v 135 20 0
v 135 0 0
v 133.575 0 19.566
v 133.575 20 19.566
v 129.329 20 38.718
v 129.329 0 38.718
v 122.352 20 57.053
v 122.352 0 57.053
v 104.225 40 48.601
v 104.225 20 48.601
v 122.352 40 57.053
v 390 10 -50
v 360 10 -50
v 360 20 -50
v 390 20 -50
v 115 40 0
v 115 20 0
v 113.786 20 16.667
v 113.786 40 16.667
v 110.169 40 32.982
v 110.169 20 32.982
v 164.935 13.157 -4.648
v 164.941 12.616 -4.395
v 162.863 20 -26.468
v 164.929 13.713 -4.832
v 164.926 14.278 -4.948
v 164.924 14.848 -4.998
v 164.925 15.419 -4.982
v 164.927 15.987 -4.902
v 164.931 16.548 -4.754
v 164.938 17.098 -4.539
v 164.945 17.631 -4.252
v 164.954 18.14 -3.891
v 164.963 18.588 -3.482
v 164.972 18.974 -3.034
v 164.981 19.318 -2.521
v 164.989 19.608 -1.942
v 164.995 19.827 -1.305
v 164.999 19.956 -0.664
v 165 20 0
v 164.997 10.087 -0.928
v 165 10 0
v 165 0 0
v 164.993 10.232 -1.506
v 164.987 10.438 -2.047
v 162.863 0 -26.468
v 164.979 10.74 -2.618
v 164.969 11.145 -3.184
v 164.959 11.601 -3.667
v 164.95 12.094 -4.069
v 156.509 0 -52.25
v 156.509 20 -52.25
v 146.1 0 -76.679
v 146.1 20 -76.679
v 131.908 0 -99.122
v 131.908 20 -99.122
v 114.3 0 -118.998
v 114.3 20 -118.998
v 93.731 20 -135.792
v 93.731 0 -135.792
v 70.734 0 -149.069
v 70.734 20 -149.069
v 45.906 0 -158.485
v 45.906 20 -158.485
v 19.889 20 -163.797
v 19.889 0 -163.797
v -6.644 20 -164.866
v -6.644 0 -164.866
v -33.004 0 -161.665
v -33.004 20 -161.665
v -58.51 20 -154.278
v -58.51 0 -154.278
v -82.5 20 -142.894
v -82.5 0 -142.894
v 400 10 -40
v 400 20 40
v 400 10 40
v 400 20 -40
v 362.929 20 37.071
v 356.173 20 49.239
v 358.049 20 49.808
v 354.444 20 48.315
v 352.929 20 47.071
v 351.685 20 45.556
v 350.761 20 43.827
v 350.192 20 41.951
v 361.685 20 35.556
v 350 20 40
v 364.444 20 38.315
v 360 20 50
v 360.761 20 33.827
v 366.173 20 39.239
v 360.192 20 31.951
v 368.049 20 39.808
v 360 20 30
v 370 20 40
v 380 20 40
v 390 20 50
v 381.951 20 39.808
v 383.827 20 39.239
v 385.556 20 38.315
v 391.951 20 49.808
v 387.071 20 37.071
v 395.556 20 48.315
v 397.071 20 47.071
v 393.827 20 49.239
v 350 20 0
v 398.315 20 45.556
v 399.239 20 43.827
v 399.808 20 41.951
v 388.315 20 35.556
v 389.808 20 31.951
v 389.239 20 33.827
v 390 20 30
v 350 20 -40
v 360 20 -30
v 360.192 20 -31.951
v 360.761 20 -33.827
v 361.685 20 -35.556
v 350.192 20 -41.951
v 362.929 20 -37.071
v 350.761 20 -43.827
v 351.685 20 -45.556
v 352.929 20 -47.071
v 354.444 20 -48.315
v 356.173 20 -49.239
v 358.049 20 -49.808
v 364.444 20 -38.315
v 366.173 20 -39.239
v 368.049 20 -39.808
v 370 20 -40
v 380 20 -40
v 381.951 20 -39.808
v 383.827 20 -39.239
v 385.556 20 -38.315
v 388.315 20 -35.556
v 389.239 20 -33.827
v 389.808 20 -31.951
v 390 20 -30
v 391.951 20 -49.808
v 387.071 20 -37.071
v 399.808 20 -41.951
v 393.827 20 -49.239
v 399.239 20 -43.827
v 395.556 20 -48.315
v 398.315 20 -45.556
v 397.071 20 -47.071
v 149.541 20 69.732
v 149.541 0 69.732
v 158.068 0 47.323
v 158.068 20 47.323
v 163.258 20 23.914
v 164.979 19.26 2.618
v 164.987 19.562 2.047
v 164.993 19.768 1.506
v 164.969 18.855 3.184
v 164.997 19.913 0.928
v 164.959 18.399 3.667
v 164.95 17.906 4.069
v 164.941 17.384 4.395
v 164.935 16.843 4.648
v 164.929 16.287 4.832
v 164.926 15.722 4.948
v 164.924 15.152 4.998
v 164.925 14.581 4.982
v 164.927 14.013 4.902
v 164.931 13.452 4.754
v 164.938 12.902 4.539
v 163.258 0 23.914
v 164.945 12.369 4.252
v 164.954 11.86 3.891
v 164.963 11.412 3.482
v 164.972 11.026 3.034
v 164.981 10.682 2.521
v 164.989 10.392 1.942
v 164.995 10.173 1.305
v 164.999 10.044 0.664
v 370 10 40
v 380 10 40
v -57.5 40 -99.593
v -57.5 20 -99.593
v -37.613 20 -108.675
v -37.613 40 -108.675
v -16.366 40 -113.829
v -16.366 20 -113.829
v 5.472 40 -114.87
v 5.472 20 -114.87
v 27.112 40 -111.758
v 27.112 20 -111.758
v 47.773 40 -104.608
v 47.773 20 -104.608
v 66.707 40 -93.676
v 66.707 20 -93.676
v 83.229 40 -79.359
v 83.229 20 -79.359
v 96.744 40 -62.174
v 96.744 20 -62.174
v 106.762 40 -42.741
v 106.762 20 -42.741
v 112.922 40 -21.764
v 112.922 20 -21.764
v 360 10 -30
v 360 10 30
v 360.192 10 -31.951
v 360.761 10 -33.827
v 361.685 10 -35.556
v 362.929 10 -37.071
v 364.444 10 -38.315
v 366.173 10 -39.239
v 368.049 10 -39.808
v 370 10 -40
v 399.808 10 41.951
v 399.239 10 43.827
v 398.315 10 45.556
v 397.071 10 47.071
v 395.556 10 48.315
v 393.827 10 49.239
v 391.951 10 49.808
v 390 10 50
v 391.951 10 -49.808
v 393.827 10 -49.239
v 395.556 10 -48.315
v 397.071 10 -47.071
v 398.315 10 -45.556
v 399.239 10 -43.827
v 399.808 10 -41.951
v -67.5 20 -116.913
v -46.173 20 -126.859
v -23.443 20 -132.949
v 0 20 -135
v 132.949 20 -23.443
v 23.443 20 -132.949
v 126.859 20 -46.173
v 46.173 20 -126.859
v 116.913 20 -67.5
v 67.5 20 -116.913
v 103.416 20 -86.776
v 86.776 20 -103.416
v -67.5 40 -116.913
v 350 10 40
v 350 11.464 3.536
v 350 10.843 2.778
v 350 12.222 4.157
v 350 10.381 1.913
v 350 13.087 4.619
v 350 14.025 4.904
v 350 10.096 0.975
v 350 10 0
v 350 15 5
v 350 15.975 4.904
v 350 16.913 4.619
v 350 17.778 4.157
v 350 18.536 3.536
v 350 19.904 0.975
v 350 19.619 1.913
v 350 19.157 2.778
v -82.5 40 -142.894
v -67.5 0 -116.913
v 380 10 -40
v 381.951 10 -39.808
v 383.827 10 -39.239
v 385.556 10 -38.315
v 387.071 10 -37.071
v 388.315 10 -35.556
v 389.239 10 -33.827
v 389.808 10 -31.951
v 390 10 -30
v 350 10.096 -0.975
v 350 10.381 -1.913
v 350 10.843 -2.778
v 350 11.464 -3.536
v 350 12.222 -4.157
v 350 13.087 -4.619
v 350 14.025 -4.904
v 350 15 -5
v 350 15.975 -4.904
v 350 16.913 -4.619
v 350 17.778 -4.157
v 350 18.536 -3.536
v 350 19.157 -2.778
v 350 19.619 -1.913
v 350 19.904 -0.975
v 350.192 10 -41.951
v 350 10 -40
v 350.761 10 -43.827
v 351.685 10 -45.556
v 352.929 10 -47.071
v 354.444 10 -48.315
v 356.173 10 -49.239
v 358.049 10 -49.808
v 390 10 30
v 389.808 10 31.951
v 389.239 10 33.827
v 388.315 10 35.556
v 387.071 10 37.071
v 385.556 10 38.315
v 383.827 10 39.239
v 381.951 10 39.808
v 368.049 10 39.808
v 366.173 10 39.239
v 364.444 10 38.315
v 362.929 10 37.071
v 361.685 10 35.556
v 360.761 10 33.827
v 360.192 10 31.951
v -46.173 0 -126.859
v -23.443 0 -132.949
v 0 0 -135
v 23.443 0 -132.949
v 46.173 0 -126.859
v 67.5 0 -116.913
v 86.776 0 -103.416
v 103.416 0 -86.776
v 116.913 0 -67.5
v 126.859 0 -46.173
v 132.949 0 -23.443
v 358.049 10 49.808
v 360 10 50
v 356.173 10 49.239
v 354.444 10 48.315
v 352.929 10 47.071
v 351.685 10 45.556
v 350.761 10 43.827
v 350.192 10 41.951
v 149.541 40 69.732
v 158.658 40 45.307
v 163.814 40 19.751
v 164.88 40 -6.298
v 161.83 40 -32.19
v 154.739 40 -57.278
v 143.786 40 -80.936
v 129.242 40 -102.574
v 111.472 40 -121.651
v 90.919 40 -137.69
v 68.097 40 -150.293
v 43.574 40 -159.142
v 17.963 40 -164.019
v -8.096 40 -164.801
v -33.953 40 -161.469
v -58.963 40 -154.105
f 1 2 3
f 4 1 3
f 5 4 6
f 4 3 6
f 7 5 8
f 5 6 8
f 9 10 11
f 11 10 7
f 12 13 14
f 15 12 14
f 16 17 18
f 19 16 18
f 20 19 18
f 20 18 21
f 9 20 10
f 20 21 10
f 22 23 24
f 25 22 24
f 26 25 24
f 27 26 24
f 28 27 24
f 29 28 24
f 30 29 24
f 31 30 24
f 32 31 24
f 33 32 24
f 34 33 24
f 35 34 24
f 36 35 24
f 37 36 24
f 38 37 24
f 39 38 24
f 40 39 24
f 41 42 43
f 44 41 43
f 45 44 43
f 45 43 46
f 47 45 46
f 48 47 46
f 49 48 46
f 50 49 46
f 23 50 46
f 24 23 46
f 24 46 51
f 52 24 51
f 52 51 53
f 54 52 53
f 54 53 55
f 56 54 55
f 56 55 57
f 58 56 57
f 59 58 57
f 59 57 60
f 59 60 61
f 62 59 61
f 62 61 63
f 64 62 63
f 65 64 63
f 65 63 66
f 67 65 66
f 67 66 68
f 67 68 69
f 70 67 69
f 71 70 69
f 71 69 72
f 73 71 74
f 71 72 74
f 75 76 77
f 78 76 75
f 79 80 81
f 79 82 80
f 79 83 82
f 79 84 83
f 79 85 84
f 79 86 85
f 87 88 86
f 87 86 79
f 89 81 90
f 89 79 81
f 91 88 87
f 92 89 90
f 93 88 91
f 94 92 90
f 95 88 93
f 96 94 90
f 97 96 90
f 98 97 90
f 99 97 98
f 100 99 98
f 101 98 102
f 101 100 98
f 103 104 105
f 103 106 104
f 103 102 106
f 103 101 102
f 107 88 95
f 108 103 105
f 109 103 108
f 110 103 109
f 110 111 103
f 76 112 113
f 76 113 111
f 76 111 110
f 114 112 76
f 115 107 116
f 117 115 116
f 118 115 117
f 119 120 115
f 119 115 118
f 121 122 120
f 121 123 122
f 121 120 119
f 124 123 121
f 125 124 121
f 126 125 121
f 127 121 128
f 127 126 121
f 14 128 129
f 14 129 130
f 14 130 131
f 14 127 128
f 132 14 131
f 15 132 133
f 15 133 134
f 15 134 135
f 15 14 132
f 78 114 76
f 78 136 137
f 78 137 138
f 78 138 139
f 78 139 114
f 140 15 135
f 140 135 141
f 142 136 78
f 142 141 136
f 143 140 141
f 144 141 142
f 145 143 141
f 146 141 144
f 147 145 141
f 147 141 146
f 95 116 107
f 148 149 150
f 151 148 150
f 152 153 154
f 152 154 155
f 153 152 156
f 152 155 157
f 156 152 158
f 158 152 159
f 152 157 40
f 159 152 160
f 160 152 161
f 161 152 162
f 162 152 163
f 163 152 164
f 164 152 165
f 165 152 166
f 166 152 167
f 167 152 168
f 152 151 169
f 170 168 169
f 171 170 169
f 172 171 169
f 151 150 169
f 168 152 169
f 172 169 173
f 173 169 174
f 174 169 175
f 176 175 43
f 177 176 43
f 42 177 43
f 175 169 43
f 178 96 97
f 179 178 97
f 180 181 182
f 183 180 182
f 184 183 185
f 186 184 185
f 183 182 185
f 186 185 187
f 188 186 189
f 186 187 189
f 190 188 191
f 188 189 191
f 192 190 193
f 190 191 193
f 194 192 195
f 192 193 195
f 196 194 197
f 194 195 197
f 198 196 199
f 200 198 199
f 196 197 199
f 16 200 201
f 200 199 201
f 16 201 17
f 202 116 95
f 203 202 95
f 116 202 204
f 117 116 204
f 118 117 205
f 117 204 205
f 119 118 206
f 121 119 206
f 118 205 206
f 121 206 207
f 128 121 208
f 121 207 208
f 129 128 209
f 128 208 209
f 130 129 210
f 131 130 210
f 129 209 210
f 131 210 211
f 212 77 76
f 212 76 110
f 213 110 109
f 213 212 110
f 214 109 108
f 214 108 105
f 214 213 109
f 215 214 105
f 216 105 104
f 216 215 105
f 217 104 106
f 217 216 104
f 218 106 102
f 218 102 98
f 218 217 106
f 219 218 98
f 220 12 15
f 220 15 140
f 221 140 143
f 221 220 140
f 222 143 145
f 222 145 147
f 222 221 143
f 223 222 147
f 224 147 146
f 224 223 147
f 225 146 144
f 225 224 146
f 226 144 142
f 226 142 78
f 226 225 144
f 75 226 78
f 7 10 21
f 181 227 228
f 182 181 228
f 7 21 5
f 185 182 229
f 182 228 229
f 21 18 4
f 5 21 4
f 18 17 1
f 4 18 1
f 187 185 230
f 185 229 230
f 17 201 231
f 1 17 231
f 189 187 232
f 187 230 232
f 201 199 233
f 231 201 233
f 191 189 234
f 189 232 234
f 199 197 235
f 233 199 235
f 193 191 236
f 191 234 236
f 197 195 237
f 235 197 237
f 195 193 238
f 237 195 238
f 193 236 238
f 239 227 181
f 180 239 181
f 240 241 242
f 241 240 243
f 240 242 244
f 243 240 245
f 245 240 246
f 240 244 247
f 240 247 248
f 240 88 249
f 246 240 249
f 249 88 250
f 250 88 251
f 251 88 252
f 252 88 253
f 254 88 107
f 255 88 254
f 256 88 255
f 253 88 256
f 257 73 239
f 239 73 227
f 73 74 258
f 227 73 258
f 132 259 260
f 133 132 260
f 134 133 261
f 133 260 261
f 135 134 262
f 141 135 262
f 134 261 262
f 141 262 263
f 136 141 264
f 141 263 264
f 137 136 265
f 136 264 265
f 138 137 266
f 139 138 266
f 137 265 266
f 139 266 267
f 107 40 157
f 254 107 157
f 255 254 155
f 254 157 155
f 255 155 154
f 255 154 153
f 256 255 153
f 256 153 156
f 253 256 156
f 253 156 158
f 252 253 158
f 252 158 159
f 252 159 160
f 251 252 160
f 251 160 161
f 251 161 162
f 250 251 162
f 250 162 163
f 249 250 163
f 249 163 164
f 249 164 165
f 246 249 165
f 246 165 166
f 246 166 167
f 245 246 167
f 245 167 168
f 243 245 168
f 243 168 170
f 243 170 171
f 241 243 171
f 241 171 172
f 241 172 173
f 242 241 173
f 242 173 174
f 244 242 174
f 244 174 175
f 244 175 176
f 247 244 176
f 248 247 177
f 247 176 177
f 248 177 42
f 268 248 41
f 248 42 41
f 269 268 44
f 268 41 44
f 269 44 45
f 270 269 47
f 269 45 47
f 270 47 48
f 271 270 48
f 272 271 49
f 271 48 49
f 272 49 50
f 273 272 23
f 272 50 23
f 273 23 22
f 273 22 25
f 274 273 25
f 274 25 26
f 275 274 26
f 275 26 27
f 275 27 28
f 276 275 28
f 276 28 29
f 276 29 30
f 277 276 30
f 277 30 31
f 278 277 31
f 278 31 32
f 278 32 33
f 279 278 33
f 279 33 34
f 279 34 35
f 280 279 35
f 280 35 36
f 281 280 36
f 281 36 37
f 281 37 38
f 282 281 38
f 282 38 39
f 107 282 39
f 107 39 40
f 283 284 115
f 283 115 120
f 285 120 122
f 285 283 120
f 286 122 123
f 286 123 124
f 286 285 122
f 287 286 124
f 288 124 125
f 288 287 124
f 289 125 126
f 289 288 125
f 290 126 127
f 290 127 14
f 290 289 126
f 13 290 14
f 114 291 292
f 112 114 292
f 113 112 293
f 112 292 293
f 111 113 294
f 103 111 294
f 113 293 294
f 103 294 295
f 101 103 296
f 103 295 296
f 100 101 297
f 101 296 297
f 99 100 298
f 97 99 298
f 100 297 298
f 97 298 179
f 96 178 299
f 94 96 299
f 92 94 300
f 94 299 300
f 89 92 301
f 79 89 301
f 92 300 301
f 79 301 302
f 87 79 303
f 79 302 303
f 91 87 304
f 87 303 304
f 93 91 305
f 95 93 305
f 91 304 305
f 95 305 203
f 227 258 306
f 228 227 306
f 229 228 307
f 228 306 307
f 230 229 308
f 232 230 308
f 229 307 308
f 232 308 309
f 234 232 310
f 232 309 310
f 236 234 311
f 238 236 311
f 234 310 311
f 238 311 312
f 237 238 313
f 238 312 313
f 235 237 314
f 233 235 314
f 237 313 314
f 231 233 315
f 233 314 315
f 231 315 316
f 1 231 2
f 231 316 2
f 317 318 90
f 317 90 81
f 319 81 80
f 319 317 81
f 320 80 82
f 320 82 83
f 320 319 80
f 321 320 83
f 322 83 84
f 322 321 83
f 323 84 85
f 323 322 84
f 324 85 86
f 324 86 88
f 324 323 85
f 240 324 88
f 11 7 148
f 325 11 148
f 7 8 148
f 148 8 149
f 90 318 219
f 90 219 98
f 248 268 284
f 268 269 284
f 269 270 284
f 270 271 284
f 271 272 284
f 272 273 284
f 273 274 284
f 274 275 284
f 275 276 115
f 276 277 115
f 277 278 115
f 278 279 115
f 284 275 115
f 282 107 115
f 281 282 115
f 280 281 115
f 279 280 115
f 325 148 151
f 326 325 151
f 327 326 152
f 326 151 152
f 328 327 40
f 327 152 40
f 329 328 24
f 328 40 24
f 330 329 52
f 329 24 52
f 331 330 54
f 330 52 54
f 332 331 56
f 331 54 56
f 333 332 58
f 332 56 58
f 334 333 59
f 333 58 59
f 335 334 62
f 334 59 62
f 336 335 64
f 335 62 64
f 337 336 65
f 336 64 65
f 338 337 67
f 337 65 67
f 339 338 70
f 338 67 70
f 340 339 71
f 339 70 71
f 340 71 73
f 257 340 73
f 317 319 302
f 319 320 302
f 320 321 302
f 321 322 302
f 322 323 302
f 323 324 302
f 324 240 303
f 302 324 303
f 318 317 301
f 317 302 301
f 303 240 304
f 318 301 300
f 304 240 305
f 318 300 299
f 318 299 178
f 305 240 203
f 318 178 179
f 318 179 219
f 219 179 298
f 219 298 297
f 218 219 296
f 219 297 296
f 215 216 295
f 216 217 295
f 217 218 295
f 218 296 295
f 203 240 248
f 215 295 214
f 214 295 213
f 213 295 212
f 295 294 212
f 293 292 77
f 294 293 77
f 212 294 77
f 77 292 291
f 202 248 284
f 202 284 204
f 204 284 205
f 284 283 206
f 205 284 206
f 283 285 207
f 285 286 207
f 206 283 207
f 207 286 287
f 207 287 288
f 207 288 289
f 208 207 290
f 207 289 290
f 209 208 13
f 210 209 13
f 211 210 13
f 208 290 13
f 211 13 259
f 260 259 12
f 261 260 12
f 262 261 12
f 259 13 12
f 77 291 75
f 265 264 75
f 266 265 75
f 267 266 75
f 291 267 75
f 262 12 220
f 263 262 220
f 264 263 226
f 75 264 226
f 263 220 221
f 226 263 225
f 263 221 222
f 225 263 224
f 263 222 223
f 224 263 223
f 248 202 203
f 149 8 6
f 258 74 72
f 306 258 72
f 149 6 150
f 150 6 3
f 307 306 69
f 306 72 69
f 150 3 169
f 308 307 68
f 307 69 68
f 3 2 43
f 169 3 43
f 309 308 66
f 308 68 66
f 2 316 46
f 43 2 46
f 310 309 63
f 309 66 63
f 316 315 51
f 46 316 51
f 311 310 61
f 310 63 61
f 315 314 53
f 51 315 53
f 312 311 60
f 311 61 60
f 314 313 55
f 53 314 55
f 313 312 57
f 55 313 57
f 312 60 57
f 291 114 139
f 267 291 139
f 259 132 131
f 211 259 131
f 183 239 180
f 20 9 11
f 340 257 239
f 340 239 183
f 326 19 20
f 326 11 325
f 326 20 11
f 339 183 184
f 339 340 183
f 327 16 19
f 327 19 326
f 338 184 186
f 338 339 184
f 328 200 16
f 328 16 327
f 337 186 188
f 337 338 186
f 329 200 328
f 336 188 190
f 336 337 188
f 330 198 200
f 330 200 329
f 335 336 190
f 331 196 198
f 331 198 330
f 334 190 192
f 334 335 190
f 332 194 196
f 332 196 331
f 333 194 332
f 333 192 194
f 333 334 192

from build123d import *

# Parameters (mm, degrees)
BOSS_EXTRUDE1_DEPTH = 20
BOSS_EXTRUDE2_DEPTH = 20
SWEEP1_START        = 164
SWEEP1_OUTLINE_R    = 5
SWEEP1_DEPTH        = 186
SKETCH4_W           = 100
SKETCH4_H           = 10
BOSS_EXTRUDE3_DEPTH = 50
CUT_EXTRUDE1_DEPTH  = 50
FILLET1_START       = 10
FILLET1_DEPTH       = 10
FILLET1_2_DEPTH     = 10


with BuildPart() as part:
    # Sketch1 → Boss-Extrude1 (new body)
    with BuildSketch(Plane(origin=(0, 0, 0), x_dir=(1, 0, 0), z_dir=(0, 1, 0))):
        with BuildLine():
            Line((-82.5, 142.894191624), (-67.5, 116.913429511))
            ThreePointArc((-67.5, 116.913429511), (67.5, 116.913429511), (135, 0))
            ThreePointArc((135, 0), (131.799960961, -29.219347882), (122.35155125, -57.053465335))
            Line((122.35155125, -57.053465335), (149.540784861, -69.732013187))
            ThreePointArc((149.540784861, -69.732013187), (161.088841175, -35.7125363), (165, 0))
            ThreePointArc((165, 0), (82.5, 142.894191624), (-82.5, 142.894191624))
        make_face()
    extrude(amount=BOSS_EXTRUDE1_DEPTH)

    # Sketch2 → Boss-Extrude2 (add)
    with BuildSketch(Plane(origin=(0, 20, 0), x_dir=(1, 0, 0), z_dir=(0, 1, 0))):
        with BuildLine():
            ThreePointArc((122.35155125, -57.053465335), (91.204678028, 99.532440469), (-67.5, 116.913429511))
            Line((-67.5, 116.913429511), (-57.5, 99.592921435))
            ThreePointArc((-57.5, 99.592921435), (57.5, 99.592921435), (115, 0))
            ThreePointArc((115, 0), (112.274040819, -24.890555603), (104.225395509, -48.6011001))
            Line((104.225395509, -48.6011001), (122.35155125, -57.053465335))
        make_face()
        with BuildLine():
            Line((-82.5, 142.894191624), (-67.5, 116.913429511))
            ThreePointArc((-67.5, 116.913429511), (91.204678028, 99.532440469), (122.35155125, -57.053465335))
            Line((122.35155125, -57.053465335), (149.540784861, -69.732013187))
            ThreePointArc((149.540784861, -69.732013187), (111.472384257, 121.650760574), (-82.5, 142.894191624))
        make_face()
    extrude(amount=BOSS_EXTRUDE2_DEPTH)

    # Sweep1: read off the stored shape, not the designer's step
    # Sweep1 outline → Sweep1 (add)
    with BuildSketch(Plane.YZ.offset(SWEEP1_START)):
        with Locations((15, 0)):
            Circle(SWEEP1_OUTLINE_R)
    extrude(amount=SWEEP1_DEPTH)

    # Sketch4 → Boss-Extrude3 (add)
    with BuildSketch(Plane(origin=(350, 0, 0), x_dir=(1.4081184135372707e-12, 0, -1.0), z_dir=(1.0, 0, 1.4081184135372707e-12))):
        with Locations((0, 15)):
            Rectangle(SKETCH4_W, SKETCH4_H)
    extrude(amount=BOSS_EXTRUDE3_DEPTH)

    # Sketch5 → Cut-Extrude1 (cut)
    with BuildSketch(Plane(origin=(0, 20, 0), x_dir=(1, 0, 0), z_dir=(0, 1, 0))):
        Polygon((360, 40), (360, 0), (360, -40), (390, -40), (390, 40), align=None)
    extrude(amount=-CUT_EXTRUDE1_DEPTH, mode=Mode.SUBTRACT)

    # Fillet1: read off the stored shape, not the designer's step
    # Fillet1 outline → Fillet1 (cut)
    with BuildSketch(Plane(origin=(0, 0, 0), x_dir=(1, 0, 0), z_dir=(0, 1, 0)).offset(FILLET1_START)):
        with BuildLine():
            ThreePointArc((390, 50), (397.071067812, 47.071067812), (400, 40))
            Line((400, 40), (400, 50))
            Line((400, 50), (390, 50))
        make_face()
        with BuildLine():
            Line((400, -50), (400, -40))
            ThreePointArc((400, -40), (397.071067812, -47.071067812), (390, -50))
            Line((390, -50), (400, -50))
        make_face()
        with BuildLine():
            ThreePointArc((350, 40), (352.928932188, 47.071067812), (360, 50))
            Line((360, 50), (350, 50))
            Line((350, 50), (350, 40))
        make_face()
        with BuildLine():
            Line((350, -50), (360, -50))
            ThreePointArc((360, -50), (352.928932188, -47.071067812), (350, -40))
            Line((350, -40), (350, -50))
        make_face()
    extrude(amount=FILLET1_DEPTH, mode=Mode.SUBTRACT)

    # Fillet1 2 outline → Fillet1 2 (add)
    with BuildSketch(Plane(origin=(0, 0, 0), x_dir=(1, 0, 0), z_dir=(0, 1, 0)).offset(FILLET1_START)):
        with BuildLine():
            Line((390, -40), (390, -30))
            ThreePointArc((390, -30), (387.071067812, -37.071067812), (380, -40))
            Line((380, -40), (390, -40))
        make_face()
        with BuildLine():
            ThreePointArc((380, 40), (387.071067812, 37.071067812), (390, 30))
            Line((390, 30), (390, 40))
            Line((390, 40), (380, 40))
        make_face()
        with BuildLine():
            Line((360, -40), (370, -40))
            ThreePointArc((370, -40), (362.928932188, -37.071067812), (360, -30))
            Line((360, -30), (360, -40))
        make_face()
        with BuildLine():
            ThreePointArc((360, 30), (362.928932188, 37.071067812), (370, 40))
            Line((370, 40), (360, 40))
            Line((360, 40), (360, 30))
        make_face()
    extrude(amount=FILLET1_2_DEPTH)


solid = part.part
